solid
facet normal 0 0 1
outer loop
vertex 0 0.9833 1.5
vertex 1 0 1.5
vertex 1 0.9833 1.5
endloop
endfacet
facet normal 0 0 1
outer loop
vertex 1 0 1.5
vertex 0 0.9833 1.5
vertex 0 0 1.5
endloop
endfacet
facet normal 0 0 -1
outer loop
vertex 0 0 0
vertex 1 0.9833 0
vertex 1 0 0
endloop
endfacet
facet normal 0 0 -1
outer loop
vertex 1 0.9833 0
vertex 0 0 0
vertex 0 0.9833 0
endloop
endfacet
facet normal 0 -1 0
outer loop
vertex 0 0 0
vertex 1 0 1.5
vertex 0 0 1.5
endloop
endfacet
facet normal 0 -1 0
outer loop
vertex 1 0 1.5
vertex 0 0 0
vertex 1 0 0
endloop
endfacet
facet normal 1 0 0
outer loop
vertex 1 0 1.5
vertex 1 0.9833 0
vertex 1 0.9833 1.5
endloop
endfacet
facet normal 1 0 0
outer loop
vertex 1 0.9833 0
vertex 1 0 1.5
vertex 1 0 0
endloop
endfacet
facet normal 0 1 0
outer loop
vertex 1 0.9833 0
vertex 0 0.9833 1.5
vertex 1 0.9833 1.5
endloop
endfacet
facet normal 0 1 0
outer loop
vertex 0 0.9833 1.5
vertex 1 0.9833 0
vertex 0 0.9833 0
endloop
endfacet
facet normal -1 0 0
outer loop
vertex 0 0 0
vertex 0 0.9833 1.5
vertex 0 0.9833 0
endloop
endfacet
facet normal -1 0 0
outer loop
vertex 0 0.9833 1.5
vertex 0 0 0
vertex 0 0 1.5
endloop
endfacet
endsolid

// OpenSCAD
// Generated by SolidPython 1.0.2 on 2020-11-24 23:03:23


union() {
	translate(v = [0.0166666667, 0, 0]) {
		cube(size = [0.0000000000, 1.9666666667, 1.5000000000]);
	}
	cube(size = [1, 0.9833333333, 1.5000000000]);
}
